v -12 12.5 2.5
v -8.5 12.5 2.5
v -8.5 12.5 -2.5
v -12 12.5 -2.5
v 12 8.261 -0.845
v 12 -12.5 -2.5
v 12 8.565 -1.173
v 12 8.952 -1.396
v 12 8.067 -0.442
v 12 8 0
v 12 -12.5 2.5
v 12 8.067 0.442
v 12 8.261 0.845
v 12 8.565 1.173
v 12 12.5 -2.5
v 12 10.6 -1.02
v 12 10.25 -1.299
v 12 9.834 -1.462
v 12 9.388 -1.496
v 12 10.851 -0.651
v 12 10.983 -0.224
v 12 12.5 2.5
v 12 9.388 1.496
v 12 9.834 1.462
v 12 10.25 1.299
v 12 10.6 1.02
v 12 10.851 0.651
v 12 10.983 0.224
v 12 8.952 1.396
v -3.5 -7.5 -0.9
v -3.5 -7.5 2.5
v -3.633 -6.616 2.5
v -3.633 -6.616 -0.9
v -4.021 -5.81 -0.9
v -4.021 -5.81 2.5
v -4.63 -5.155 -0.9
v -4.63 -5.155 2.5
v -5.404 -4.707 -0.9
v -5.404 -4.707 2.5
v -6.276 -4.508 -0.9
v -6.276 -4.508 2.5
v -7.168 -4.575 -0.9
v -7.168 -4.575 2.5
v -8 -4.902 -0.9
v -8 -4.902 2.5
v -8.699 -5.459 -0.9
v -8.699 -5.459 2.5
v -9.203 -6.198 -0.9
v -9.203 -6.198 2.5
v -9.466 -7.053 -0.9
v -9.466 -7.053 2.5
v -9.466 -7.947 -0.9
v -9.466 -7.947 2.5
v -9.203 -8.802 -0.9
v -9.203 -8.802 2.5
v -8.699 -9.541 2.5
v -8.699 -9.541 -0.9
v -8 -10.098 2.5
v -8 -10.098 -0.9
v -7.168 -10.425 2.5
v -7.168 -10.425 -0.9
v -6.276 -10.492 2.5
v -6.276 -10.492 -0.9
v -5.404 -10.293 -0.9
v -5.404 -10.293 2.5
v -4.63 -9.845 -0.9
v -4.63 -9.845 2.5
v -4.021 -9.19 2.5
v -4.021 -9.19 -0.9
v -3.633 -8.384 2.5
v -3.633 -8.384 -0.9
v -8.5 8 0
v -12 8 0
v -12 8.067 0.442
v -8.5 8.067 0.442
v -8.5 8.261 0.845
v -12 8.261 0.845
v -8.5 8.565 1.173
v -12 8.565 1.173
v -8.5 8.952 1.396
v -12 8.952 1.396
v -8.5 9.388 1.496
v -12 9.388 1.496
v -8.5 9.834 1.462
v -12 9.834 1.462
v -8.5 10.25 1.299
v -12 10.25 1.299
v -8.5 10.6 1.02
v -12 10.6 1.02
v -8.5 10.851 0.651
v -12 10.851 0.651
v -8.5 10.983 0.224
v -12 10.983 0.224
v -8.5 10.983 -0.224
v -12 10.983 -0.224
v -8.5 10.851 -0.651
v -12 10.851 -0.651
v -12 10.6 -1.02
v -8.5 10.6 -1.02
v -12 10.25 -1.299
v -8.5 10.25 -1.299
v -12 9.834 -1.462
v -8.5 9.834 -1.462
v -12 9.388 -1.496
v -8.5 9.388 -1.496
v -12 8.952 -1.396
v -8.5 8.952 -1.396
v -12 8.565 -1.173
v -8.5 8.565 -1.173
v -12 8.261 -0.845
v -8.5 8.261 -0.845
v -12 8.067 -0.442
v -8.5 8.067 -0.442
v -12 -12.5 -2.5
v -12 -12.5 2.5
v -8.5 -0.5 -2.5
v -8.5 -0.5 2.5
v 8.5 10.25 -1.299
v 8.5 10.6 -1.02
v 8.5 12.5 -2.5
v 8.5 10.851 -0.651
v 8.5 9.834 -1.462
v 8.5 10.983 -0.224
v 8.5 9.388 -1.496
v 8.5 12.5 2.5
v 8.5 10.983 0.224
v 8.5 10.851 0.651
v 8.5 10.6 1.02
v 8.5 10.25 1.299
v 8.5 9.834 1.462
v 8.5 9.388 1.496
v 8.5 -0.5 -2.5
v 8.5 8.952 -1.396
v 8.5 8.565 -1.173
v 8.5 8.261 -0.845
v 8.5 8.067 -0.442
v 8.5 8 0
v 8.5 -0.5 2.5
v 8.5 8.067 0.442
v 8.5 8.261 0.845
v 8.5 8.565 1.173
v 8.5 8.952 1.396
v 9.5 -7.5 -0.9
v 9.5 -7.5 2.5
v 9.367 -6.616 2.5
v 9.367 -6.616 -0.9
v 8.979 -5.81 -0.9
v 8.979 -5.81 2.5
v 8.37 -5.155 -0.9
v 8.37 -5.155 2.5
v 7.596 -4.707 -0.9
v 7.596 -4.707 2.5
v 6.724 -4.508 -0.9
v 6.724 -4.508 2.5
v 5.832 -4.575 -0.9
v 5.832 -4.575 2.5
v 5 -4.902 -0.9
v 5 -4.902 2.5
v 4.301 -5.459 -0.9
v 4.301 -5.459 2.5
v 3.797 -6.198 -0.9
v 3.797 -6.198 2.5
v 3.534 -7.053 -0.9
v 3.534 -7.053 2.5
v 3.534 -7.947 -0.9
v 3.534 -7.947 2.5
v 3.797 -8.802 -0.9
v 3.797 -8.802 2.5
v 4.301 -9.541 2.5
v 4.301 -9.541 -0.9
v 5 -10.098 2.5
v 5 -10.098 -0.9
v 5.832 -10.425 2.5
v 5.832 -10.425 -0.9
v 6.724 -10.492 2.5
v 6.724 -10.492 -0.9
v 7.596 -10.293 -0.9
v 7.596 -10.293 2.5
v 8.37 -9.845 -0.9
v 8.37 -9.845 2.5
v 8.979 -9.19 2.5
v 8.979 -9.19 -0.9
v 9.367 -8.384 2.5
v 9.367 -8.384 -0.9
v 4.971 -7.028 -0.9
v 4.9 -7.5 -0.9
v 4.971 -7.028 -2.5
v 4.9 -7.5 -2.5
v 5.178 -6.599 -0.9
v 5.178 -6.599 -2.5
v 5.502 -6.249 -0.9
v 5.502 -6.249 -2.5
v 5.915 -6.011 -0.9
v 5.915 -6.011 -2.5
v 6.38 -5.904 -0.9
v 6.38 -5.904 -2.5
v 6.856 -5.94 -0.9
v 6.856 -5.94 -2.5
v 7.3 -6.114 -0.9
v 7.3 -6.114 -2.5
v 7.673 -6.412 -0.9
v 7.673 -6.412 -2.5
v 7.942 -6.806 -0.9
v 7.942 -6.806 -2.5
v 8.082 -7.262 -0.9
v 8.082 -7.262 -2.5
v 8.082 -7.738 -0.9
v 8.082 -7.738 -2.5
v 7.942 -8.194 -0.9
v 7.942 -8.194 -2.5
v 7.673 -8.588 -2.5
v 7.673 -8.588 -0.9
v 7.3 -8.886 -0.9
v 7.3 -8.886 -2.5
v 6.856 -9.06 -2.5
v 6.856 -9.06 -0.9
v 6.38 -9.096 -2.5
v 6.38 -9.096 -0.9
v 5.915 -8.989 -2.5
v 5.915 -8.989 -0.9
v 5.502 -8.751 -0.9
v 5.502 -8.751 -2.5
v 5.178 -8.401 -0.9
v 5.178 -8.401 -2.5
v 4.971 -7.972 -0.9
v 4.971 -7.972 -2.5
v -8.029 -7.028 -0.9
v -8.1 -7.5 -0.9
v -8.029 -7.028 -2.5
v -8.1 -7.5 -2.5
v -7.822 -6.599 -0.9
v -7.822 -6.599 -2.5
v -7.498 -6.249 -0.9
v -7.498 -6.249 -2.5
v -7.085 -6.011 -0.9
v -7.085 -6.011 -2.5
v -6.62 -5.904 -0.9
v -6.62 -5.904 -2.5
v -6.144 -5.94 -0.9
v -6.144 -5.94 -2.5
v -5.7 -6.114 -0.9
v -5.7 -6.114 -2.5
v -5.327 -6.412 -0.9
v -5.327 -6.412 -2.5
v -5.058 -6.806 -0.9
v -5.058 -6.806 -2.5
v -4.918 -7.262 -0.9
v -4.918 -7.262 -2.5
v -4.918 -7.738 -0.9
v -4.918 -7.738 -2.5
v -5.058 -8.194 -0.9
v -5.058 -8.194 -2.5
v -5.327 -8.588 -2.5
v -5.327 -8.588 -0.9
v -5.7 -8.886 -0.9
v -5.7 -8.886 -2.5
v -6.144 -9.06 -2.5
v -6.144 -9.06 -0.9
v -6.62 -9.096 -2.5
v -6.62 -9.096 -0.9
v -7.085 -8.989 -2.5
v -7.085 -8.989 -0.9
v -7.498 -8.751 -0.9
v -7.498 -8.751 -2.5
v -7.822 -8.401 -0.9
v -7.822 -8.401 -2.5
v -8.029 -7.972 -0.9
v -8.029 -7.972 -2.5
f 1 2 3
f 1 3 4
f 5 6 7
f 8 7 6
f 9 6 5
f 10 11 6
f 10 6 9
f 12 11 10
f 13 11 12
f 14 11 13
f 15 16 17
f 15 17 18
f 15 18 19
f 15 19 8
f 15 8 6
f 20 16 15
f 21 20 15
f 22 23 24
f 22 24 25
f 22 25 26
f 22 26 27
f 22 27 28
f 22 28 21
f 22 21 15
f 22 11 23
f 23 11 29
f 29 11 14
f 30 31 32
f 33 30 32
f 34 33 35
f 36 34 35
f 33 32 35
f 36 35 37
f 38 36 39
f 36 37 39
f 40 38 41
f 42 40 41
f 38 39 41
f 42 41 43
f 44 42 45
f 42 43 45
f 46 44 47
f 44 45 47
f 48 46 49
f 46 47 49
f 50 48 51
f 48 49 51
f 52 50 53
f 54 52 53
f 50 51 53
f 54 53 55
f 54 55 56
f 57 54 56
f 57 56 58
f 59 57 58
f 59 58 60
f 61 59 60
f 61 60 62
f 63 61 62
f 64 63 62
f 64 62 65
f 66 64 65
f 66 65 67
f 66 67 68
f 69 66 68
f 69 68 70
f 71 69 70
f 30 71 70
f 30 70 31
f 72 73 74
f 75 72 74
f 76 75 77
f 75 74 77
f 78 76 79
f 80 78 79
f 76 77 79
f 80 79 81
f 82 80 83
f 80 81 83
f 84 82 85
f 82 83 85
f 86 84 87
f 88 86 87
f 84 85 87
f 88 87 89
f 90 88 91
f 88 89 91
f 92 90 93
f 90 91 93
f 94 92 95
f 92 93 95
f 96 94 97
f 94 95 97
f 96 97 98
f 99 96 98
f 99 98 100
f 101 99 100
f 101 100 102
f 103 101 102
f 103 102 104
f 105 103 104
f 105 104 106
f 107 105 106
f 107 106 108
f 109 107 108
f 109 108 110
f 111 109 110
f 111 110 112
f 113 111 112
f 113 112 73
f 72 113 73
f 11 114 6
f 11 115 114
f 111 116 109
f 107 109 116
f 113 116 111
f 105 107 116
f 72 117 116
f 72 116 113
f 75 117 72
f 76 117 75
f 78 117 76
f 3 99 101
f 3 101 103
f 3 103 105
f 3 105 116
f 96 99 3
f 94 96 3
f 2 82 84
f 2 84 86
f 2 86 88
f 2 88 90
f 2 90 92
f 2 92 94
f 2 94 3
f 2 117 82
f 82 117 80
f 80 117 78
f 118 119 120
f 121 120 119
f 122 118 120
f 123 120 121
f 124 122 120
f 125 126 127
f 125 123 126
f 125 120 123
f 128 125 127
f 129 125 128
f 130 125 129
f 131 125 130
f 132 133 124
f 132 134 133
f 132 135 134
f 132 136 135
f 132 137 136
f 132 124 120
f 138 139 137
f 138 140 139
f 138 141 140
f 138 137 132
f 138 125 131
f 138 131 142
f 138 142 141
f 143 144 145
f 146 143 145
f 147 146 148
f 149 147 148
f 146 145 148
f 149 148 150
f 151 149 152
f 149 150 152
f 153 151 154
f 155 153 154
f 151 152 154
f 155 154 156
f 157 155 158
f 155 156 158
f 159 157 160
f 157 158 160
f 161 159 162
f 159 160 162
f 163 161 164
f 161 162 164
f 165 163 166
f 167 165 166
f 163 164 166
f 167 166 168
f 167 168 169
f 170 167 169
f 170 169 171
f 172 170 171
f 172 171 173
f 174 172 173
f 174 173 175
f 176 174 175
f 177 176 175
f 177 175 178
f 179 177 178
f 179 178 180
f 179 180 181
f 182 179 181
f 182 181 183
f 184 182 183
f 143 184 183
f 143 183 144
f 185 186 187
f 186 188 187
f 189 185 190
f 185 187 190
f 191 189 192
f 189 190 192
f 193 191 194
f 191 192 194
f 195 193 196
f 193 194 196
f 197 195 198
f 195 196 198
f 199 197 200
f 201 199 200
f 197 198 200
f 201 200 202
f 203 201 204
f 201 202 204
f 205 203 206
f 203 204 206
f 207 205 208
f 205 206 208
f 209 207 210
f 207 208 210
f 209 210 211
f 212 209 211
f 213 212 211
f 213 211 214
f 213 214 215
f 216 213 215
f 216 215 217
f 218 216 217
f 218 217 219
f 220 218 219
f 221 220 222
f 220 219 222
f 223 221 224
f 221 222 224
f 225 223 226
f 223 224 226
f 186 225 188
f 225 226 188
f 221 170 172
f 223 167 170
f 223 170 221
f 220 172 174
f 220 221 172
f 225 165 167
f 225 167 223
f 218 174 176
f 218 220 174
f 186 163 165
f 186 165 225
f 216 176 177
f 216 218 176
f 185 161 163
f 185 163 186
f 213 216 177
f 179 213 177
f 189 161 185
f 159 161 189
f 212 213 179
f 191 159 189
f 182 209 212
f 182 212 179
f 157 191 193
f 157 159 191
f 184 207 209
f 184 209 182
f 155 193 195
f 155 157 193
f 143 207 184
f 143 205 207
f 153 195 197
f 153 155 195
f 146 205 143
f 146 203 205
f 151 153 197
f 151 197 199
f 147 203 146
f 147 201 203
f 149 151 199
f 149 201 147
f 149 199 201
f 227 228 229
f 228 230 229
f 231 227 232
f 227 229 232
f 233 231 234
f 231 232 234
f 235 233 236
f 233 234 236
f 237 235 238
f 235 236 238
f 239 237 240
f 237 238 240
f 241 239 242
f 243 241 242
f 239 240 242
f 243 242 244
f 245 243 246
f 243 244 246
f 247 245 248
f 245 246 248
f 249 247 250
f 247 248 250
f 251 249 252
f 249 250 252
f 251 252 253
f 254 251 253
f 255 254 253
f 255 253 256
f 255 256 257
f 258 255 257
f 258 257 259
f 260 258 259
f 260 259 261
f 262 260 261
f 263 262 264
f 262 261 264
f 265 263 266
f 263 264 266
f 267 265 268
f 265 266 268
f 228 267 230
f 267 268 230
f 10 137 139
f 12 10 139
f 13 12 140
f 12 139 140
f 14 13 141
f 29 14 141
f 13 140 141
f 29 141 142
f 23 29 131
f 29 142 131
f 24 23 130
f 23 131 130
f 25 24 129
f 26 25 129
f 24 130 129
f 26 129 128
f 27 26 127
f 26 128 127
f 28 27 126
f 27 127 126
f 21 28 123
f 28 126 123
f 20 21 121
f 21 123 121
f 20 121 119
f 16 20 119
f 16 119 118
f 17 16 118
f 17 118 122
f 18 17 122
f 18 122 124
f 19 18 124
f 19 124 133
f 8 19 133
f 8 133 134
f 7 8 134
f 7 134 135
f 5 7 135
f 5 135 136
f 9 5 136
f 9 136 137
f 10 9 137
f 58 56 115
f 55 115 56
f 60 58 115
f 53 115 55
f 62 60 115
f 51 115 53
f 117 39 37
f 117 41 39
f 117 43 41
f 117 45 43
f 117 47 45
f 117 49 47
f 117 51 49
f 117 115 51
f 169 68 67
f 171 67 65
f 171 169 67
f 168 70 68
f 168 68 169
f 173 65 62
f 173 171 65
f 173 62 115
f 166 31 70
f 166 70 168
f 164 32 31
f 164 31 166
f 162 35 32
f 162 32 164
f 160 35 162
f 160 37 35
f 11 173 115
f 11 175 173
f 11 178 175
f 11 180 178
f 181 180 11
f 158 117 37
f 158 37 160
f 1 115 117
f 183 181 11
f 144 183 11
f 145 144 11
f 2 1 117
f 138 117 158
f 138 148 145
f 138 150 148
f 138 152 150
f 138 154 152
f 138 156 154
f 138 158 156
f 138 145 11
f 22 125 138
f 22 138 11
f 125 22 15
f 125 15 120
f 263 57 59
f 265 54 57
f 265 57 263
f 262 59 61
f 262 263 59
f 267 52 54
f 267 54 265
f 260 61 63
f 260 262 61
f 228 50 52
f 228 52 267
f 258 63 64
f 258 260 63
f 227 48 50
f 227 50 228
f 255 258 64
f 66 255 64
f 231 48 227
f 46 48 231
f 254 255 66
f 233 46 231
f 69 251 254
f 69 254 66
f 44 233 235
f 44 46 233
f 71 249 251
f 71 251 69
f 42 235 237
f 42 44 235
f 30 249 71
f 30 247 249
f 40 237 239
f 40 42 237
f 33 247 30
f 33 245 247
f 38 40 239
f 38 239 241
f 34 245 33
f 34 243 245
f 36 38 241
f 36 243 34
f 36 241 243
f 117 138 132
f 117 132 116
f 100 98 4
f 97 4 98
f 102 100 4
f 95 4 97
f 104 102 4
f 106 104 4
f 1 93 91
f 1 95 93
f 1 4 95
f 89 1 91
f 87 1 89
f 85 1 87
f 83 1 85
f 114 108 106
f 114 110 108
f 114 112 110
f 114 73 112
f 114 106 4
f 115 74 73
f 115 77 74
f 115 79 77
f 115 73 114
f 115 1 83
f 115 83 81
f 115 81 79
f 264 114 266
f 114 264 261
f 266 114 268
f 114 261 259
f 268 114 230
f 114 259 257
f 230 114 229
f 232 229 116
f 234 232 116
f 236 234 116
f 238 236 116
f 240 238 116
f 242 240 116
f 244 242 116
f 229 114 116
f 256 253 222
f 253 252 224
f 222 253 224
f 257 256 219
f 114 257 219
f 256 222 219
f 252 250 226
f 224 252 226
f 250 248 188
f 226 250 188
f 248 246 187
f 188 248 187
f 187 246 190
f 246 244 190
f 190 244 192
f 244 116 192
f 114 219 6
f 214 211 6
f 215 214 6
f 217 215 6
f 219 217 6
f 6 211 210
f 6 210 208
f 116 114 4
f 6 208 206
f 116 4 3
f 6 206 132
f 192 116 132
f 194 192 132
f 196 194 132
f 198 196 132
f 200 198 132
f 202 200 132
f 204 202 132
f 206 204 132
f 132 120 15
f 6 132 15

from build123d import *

# Parameters (mm, degrees)
F1_DEPTH       = 2.5
F3_D           = 3.2
F3_CBORE_D     = 6
F3_CBORE_DEPTH = 3.4
F5_D           = 3


with BuildPart() as f1:
    # F0 (on Top) → F1 (new body, symmetric)
    with BuildSketch(Plane.XY):
        Polygon((12, -12.5), (12, 12.5), (8.5, 12.5), (8.5, -0.5), (-8.5, -0.5), (-8.5, 12.5), (-12, 12.5), (-12, -12.5), align=None)
    extrude(amount=F1_DEPTH, both=True)

    # F3 (through all)
    with Locations(Plane.XY.offset(2.5)):
        with Locations((-6.5, -7.5), (6.5, -7.5)):
            CounterBoreHole(F3_D / 2, F3_CBORE_D / 2, F3_CBORE_DEPTH)

    # F5 (through all)
    with Locations(Plane.YZ.offset(12)):
        with Locations((9.5, 0)):
            Hole(F5_D / 2)


solid = f1.part
